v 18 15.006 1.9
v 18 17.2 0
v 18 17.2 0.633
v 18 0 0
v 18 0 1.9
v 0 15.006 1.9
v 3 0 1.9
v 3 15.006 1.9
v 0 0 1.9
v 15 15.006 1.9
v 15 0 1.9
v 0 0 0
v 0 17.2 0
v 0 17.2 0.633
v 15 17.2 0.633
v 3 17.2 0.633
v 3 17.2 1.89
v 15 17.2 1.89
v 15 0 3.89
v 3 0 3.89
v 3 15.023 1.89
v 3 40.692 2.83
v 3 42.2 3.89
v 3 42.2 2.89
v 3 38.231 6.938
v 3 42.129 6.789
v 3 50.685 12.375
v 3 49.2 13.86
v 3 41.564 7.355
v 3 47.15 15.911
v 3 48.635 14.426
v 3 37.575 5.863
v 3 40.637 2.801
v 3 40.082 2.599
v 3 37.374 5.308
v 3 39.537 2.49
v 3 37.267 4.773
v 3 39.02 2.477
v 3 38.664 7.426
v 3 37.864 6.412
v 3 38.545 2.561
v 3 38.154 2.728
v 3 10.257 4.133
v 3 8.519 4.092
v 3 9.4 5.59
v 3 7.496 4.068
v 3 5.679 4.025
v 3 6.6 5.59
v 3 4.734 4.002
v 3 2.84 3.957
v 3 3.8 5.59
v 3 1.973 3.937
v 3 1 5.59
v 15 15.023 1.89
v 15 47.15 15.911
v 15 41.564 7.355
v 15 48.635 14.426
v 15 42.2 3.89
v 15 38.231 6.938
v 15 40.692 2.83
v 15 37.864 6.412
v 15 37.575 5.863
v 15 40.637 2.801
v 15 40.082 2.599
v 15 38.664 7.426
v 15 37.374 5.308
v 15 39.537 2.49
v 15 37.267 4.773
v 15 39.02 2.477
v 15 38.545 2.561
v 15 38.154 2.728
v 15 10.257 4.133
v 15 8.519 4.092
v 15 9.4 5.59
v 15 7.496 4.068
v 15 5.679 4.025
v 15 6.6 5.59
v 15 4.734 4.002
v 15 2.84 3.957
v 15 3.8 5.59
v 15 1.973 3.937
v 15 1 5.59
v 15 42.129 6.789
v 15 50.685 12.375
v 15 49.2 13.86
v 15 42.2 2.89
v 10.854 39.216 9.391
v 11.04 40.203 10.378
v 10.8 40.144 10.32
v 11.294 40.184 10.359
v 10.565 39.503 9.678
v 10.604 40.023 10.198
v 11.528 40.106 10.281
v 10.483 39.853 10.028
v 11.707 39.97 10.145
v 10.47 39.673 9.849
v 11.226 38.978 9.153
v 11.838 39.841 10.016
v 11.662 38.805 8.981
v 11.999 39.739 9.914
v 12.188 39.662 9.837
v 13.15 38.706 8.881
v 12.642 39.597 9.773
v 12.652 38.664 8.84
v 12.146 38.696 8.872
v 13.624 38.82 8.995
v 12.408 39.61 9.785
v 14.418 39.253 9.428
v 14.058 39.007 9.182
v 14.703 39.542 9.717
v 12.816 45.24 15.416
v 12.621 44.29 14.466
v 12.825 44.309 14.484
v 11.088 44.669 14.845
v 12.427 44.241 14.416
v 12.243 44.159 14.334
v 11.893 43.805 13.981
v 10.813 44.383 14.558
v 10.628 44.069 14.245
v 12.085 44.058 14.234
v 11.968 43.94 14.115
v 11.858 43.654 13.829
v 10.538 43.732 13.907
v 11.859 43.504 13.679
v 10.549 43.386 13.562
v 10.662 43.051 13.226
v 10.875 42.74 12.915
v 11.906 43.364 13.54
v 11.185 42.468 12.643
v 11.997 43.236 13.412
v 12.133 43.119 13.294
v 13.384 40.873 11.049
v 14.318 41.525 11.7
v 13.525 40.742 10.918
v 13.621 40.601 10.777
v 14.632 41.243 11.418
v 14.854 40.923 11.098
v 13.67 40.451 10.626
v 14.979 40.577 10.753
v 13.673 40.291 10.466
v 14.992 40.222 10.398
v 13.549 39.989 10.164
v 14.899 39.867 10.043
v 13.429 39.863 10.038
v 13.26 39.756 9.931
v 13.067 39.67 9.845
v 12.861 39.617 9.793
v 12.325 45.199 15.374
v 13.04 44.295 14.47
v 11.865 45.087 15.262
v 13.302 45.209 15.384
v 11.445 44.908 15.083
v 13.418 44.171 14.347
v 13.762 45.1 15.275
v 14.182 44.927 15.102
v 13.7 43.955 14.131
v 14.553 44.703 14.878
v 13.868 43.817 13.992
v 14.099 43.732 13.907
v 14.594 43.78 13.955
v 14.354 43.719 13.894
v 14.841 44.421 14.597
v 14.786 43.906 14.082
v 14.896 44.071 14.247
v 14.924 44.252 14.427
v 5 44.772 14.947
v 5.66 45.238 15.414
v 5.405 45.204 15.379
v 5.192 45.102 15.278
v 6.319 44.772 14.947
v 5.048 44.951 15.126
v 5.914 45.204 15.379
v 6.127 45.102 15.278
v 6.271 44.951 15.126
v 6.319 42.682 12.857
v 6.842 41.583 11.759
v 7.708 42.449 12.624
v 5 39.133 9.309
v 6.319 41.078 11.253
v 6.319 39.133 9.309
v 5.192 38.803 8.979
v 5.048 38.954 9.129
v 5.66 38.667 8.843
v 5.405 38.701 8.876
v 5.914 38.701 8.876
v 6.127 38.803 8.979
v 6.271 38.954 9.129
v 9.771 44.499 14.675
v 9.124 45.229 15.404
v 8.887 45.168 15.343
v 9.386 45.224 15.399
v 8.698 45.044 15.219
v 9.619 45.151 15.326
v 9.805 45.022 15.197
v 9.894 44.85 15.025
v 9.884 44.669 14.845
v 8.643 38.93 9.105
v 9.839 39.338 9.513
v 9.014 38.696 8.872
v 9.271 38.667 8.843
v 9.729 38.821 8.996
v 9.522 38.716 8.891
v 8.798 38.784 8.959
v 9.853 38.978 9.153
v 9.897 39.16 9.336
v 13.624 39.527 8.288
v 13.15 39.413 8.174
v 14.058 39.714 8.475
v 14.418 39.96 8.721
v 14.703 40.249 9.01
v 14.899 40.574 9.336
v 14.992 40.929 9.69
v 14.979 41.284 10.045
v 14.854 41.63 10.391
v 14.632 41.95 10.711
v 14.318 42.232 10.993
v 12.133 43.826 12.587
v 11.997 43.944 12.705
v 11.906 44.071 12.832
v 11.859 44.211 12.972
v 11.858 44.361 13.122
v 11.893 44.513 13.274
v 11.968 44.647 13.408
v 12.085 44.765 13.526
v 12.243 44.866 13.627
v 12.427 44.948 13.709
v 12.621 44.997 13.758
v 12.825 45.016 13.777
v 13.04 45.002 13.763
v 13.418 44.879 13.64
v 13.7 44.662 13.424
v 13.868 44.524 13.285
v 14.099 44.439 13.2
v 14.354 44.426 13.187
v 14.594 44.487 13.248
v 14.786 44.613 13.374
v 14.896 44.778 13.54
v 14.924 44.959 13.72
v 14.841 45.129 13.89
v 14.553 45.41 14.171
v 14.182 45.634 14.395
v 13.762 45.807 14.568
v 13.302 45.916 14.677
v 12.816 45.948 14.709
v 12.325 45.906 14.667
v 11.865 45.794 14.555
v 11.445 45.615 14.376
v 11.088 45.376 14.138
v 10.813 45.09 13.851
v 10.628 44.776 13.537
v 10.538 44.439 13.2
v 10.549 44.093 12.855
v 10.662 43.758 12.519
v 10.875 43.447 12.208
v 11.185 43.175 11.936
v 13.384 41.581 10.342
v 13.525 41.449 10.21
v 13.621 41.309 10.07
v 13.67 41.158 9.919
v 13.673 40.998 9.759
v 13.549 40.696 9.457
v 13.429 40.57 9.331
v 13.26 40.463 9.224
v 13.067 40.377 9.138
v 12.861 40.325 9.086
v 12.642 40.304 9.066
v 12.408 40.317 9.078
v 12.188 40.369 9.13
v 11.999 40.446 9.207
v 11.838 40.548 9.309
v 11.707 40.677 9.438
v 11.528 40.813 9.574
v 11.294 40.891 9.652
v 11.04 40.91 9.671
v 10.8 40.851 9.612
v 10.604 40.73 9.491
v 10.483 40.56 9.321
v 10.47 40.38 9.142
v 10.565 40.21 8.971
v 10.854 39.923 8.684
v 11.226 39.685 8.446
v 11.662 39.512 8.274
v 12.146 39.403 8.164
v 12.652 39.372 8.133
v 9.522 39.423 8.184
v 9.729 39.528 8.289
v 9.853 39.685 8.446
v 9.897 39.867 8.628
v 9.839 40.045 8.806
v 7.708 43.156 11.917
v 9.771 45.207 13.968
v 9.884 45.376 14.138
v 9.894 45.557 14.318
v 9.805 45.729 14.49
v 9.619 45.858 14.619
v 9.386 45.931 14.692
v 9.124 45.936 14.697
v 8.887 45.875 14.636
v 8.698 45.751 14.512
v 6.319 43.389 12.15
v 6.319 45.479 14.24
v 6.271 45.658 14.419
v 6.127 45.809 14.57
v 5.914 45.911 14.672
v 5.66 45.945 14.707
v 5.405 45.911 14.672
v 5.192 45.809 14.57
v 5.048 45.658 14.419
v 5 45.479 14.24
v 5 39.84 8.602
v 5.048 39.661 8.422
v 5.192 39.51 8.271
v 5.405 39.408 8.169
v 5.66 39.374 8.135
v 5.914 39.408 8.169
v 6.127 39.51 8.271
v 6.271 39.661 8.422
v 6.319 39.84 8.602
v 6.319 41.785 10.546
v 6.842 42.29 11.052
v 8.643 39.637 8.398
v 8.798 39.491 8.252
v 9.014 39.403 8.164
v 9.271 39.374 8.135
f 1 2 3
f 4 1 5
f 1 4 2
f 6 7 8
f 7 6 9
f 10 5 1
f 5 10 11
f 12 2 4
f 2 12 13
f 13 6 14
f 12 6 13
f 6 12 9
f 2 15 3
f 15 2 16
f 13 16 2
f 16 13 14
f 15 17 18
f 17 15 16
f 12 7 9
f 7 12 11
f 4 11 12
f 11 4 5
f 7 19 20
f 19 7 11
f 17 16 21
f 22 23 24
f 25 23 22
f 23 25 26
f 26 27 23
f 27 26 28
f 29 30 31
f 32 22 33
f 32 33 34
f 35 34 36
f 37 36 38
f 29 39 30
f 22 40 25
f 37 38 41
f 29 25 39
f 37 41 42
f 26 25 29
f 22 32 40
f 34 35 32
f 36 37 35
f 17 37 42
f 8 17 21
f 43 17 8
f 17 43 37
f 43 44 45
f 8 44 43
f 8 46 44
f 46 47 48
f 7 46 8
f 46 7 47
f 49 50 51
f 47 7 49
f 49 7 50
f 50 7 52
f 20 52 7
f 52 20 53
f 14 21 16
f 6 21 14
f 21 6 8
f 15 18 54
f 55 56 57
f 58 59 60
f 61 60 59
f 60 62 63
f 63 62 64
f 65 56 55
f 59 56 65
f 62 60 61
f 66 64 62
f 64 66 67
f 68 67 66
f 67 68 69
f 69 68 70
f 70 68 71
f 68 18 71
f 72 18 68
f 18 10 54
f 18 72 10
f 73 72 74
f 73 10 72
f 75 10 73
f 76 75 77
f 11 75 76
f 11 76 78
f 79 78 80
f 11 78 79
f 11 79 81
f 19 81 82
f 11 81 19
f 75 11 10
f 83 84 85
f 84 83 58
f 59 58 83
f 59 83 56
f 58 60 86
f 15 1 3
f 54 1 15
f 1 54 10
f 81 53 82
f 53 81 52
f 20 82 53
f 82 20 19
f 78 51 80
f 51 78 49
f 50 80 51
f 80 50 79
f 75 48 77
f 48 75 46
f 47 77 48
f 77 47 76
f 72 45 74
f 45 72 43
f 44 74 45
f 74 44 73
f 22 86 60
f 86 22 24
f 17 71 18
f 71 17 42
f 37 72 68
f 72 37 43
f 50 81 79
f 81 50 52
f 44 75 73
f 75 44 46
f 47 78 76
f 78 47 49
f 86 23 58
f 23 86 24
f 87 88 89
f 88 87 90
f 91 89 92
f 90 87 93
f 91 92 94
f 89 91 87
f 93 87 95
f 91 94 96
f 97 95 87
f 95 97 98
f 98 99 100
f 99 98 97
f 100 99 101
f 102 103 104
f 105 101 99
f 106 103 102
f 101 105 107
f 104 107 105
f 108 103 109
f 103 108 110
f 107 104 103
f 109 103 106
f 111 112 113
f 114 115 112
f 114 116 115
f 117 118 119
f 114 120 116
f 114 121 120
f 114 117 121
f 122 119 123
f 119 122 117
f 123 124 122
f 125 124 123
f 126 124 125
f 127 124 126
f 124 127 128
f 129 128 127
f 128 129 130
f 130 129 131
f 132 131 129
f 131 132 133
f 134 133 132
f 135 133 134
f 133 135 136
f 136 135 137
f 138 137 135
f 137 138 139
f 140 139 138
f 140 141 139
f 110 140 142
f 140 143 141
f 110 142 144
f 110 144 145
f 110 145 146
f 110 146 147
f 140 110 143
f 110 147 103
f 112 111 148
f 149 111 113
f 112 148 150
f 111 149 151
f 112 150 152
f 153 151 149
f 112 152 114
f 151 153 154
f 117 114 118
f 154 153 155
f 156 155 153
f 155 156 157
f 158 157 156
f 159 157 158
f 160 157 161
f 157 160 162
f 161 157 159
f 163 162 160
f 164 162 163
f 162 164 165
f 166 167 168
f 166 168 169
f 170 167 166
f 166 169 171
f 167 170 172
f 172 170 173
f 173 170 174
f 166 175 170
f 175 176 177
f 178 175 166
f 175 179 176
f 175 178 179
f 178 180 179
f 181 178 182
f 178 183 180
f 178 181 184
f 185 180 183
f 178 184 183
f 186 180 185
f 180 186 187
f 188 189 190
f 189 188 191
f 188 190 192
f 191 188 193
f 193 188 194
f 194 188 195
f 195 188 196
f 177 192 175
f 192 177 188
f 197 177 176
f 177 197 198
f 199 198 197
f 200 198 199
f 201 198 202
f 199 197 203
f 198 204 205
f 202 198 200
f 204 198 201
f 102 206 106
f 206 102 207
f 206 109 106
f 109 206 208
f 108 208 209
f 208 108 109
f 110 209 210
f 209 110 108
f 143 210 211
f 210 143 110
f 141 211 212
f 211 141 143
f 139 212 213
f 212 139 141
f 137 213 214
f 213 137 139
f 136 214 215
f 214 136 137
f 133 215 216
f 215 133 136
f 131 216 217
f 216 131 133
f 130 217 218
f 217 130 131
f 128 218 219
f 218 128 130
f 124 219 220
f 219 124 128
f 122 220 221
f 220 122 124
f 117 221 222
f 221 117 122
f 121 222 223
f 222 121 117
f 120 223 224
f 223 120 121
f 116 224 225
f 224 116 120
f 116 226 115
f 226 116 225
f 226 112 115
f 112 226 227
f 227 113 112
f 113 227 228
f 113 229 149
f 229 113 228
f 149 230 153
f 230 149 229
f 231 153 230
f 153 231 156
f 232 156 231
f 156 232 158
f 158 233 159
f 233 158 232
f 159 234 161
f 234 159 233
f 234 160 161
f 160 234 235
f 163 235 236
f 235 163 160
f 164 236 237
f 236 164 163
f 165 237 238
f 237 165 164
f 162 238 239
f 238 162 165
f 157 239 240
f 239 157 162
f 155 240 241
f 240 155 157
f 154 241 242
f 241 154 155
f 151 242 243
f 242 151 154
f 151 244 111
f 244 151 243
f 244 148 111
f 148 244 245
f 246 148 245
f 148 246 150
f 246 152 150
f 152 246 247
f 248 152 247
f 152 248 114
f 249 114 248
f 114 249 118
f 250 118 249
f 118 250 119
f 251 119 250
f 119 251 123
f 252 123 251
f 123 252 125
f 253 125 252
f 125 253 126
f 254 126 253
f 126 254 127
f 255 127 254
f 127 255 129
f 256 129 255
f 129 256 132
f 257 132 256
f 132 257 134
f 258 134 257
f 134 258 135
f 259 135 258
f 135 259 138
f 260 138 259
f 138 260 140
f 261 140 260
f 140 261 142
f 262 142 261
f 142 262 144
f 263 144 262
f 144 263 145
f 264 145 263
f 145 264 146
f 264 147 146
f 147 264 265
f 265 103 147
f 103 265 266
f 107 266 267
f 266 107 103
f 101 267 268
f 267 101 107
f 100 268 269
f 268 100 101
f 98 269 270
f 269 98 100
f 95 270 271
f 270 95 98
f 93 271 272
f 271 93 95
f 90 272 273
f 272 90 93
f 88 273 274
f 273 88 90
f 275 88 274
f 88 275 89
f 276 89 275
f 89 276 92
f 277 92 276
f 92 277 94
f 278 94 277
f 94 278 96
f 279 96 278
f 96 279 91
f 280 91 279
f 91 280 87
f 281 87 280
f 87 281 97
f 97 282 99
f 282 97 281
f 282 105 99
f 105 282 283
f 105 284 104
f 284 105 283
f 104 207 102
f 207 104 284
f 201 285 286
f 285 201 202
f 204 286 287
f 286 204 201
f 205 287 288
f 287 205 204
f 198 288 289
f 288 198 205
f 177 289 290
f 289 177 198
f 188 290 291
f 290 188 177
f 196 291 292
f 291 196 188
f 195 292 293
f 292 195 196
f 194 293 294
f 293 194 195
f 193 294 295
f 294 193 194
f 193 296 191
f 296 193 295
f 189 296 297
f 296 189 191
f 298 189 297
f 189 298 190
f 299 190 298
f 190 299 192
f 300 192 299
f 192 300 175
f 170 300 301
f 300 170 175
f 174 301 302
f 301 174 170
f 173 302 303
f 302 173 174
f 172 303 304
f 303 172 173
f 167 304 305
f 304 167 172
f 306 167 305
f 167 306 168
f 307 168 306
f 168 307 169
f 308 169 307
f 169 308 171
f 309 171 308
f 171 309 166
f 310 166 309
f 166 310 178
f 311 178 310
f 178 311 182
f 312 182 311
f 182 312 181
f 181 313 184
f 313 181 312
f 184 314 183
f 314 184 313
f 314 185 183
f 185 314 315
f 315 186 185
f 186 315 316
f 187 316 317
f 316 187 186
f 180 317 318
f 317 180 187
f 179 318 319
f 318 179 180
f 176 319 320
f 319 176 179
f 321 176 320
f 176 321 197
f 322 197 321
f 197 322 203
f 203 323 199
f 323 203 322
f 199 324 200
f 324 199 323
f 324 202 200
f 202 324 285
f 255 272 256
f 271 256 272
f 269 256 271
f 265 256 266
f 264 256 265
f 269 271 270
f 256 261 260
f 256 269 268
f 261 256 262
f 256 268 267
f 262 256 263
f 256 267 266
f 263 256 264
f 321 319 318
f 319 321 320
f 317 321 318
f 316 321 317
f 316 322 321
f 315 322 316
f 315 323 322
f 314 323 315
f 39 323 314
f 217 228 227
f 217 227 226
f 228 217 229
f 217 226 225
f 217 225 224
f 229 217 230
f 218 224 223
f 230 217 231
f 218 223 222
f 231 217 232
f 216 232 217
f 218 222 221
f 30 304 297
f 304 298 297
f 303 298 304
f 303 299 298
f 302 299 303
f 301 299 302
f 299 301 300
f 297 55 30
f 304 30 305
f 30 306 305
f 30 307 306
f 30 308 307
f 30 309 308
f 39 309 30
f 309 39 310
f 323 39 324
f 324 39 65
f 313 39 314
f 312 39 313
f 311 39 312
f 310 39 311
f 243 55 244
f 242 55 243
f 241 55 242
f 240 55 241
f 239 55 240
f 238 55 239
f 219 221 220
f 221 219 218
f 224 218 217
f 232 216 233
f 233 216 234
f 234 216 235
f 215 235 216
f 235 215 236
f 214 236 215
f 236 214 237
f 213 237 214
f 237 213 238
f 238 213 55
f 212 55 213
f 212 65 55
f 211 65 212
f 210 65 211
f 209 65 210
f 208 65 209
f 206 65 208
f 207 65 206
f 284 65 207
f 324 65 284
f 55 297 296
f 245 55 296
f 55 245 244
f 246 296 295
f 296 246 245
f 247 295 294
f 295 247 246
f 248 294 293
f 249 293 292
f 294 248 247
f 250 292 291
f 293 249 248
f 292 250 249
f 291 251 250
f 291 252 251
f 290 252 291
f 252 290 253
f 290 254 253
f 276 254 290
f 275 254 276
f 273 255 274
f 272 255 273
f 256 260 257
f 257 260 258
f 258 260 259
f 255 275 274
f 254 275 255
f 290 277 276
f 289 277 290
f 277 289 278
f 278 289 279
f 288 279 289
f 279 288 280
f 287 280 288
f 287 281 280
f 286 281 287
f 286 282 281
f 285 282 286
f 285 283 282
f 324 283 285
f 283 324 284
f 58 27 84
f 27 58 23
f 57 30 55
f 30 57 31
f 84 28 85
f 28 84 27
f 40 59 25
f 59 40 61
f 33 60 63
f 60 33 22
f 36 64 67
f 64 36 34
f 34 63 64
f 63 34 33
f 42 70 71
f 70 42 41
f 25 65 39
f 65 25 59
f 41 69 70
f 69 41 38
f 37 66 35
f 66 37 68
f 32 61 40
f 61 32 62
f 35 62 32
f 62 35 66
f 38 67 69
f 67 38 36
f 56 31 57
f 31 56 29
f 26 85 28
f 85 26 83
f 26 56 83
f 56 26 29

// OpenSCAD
// file: hotshoe_paper_clip.scad
hs_w      = 18.0;
hs_l      = 17.2;
hs_h      = 1.9; // 2
hs2_w     = 12;
//hs2_l     = hs_l+5;
hs2_h     = 2;
hs2_x_off = (hs_w-hs2_w)/2;
hs2_elev  = 1;
hs3_l     = 12;
hs3_h     = 5;
hs3_w     = 0.8;

module hotshoe(
    logofile="", logooffset=1,
    len=5
    ) {
    hs2_l = hs_l+len;
    union() {
        // lower hotshoe
        difference() {
            cube([hs_w, hs_l, hs_h]);
            translate([-1,hs_l,hs_h/3]) rotate([60,0,0]) cube([hs2_x_off+1, 10,10]);
            translate([hs2_x_off+hs2_w,hs_l,hs_h/3]) rotate([60,0,0]) cube([hs2_x_off+1, 10,10]);
        }
        // upper plate including grip
        translate([hs2_x_off, 0, hs_h-0.01]) {
            rotate([90,0,90])
            linear_extrude(height=hs2_w) {
                polygon(
                points=[[0,0], [hs2_l,0], [hs_l,0], [hs2_l,hs2_elev],[hs2_l,hs2_elev+hs2_h],
                //[hs_l,hs2_h],
                [0,hs2_h]],
                paths=[[0,1,2,3,4,5,6]]
                );
            }
            for ( i = [0:3]) {
                translate([hs2_w/2,1+2.8*(i),hs2_h]) scale([1,1,1.7]) rotate([45,0,0]) cube([hs2_w,sqrt(2), sqrt(2)], center=true);
            }
        }
        translate([hs2_x_off, hs2_l, hs_h+hs2_elev+hs2_h/2-0.01])
        rotate([45,0,0])
        difference() {
            union() {
                // Logo
                translate([logooffset,1,hs3_h-1]) linear_extrude(height=1+1) import(file=logofile);
                // clasp
                cube([hs2_w, hs3_l, hs3_h]);
                translate([0,0,hs3_h/2]) scale([1,1.5,1]) rotate([0,90,0]) cylinder(h=hs2_w, r=hs3_h/2, $fn=36);
            }
            translate([-1,2,(hs3_h-hs3_w)/2]) cube([hs2_w+2, hs3_l, hs3_w]);
        }
    }
}
// main file
include <hotshoe_paper_clip.scad>

hotshoe(logofile="KS.dxf", logooffset=2,len=25);
